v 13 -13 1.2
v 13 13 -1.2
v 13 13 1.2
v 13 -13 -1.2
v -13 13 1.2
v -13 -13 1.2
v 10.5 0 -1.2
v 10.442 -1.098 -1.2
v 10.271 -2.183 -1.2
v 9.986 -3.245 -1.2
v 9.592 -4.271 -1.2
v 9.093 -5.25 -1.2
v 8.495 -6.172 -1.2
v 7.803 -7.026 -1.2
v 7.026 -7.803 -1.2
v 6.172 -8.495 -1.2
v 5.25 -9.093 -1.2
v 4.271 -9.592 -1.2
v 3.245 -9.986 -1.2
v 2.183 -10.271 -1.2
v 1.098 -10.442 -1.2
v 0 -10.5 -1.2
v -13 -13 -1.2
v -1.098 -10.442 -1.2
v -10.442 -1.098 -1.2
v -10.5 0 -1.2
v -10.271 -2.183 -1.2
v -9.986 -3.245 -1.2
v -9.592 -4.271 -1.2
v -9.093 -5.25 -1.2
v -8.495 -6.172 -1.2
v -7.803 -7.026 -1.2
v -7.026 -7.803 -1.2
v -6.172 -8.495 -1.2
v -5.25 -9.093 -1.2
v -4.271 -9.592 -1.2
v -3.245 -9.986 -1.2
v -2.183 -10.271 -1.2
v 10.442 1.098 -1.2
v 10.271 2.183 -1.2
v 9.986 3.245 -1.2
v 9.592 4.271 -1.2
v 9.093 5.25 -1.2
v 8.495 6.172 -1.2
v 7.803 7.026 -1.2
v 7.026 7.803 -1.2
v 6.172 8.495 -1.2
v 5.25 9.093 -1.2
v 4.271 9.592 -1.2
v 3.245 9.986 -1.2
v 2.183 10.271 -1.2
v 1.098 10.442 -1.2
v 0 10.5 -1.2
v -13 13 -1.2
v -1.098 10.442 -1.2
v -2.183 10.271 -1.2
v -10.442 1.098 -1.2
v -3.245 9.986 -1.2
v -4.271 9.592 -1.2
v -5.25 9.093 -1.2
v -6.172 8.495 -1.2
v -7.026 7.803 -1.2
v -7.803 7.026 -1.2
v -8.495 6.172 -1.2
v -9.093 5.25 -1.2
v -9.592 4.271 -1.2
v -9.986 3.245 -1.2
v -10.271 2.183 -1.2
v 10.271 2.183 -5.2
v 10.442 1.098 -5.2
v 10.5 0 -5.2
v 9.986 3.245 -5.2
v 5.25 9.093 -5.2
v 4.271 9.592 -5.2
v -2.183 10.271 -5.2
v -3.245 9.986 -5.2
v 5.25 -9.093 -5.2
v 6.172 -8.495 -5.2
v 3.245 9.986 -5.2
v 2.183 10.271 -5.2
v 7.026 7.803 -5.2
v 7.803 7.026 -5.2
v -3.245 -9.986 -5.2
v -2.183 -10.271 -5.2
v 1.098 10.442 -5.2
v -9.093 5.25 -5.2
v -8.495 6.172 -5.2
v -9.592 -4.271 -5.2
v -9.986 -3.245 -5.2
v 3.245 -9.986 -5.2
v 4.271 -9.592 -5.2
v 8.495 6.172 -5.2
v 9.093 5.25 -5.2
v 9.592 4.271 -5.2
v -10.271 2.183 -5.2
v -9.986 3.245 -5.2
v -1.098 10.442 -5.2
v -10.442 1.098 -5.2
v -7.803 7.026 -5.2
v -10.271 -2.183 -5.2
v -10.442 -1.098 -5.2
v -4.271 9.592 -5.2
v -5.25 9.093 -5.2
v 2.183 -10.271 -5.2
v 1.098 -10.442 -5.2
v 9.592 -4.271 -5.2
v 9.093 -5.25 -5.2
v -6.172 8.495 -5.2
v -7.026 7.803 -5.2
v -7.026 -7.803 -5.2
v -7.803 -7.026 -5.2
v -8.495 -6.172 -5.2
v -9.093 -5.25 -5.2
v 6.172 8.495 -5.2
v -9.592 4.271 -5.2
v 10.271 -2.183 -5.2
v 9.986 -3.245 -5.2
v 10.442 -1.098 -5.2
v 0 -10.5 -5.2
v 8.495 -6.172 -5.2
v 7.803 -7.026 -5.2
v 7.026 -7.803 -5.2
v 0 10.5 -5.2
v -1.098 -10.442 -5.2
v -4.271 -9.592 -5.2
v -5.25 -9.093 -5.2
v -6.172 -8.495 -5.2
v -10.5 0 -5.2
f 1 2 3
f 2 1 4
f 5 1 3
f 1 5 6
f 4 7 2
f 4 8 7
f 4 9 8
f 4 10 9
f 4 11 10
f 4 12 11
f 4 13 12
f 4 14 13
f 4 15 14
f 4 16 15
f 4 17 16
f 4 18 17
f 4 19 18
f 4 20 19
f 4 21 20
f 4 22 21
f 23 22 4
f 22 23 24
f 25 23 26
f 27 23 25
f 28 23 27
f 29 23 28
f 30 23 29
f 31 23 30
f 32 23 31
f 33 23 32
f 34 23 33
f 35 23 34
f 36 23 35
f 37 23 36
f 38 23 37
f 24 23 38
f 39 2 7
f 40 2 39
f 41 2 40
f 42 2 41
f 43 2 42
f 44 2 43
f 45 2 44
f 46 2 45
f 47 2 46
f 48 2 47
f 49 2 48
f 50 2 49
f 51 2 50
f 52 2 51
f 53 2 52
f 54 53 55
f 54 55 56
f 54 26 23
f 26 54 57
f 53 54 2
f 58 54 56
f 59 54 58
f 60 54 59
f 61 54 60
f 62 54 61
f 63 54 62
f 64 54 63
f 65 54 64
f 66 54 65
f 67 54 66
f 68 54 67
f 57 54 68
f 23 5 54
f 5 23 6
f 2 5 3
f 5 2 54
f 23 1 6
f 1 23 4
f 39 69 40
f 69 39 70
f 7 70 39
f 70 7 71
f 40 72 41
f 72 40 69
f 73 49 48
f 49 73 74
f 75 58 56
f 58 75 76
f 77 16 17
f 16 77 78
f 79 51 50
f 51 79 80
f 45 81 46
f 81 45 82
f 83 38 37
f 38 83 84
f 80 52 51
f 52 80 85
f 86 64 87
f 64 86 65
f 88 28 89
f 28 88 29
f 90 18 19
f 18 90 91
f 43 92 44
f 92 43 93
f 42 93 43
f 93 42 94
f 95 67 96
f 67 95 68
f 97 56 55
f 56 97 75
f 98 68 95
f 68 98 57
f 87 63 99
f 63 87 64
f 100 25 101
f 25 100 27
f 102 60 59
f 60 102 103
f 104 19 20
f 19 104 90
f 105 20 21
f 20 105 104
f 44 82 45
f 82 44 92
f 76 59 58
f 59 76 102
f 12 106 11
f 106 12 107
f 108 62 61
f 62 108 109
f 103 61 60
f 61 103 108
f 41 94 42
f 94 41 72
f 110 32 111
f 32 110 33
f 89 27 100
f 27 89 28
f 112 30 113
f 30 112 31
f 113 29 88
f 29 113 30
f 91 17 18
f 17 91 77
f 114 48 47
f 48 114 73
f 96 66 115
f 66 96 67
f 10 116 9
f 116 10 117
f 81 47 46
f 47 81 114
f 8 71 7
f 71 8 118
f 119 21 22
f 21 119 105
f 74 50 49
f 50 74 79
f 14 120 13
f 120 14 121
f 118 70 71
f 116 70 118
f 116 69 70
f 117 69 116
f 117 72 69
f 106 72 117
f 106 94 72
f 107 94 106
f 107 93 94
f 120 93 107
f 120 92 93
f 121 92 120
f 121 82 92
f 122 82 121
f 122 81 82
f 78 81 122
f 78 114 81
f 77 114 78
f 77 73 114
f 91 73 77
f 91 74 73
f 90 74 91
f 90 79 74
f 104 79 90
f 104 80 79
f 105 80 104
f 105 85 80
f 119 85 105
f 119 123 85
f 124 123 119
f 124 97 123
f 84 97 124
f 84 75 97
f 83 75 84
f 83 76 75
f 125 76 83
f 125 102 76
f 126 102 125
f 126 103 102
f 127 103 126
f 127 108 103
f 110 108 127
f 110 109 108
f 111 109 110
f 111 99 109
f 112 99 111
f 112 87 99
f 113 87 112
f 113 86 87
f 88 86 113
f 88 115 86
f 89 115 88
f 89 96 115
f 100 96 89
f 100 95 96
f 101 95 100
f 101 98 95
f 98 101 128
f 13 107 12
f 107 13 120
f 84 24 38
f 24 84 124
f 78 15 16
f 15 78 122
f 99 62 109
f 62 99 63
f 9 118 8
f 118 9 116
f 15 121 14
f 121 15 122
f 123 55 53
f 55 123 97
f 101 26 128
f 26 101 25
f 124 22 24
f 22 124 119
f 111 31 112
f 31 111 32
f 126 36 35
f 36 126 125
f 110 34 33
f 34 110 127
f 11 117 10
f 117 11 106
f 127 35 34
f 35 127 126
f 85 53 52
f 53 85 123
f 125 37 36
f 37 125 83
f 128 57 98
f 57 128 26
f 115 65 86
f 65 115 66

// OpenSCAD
// Press-fit end cap for 25 mm extrusion.
$fn = 60;
eps = 0.02;
profile = 25;
cap_t = 2.4;
wall = 2;
pin_d = profile - 2 * wall;
pin_l = 4;
union() {
    cube([profile + 1, profile + 1, cap_t], center = true);
    translate([0, 0, -cap_t / 2 - pin_l]) cylinder(d = pin_d, h = pin_l + eps);
}
